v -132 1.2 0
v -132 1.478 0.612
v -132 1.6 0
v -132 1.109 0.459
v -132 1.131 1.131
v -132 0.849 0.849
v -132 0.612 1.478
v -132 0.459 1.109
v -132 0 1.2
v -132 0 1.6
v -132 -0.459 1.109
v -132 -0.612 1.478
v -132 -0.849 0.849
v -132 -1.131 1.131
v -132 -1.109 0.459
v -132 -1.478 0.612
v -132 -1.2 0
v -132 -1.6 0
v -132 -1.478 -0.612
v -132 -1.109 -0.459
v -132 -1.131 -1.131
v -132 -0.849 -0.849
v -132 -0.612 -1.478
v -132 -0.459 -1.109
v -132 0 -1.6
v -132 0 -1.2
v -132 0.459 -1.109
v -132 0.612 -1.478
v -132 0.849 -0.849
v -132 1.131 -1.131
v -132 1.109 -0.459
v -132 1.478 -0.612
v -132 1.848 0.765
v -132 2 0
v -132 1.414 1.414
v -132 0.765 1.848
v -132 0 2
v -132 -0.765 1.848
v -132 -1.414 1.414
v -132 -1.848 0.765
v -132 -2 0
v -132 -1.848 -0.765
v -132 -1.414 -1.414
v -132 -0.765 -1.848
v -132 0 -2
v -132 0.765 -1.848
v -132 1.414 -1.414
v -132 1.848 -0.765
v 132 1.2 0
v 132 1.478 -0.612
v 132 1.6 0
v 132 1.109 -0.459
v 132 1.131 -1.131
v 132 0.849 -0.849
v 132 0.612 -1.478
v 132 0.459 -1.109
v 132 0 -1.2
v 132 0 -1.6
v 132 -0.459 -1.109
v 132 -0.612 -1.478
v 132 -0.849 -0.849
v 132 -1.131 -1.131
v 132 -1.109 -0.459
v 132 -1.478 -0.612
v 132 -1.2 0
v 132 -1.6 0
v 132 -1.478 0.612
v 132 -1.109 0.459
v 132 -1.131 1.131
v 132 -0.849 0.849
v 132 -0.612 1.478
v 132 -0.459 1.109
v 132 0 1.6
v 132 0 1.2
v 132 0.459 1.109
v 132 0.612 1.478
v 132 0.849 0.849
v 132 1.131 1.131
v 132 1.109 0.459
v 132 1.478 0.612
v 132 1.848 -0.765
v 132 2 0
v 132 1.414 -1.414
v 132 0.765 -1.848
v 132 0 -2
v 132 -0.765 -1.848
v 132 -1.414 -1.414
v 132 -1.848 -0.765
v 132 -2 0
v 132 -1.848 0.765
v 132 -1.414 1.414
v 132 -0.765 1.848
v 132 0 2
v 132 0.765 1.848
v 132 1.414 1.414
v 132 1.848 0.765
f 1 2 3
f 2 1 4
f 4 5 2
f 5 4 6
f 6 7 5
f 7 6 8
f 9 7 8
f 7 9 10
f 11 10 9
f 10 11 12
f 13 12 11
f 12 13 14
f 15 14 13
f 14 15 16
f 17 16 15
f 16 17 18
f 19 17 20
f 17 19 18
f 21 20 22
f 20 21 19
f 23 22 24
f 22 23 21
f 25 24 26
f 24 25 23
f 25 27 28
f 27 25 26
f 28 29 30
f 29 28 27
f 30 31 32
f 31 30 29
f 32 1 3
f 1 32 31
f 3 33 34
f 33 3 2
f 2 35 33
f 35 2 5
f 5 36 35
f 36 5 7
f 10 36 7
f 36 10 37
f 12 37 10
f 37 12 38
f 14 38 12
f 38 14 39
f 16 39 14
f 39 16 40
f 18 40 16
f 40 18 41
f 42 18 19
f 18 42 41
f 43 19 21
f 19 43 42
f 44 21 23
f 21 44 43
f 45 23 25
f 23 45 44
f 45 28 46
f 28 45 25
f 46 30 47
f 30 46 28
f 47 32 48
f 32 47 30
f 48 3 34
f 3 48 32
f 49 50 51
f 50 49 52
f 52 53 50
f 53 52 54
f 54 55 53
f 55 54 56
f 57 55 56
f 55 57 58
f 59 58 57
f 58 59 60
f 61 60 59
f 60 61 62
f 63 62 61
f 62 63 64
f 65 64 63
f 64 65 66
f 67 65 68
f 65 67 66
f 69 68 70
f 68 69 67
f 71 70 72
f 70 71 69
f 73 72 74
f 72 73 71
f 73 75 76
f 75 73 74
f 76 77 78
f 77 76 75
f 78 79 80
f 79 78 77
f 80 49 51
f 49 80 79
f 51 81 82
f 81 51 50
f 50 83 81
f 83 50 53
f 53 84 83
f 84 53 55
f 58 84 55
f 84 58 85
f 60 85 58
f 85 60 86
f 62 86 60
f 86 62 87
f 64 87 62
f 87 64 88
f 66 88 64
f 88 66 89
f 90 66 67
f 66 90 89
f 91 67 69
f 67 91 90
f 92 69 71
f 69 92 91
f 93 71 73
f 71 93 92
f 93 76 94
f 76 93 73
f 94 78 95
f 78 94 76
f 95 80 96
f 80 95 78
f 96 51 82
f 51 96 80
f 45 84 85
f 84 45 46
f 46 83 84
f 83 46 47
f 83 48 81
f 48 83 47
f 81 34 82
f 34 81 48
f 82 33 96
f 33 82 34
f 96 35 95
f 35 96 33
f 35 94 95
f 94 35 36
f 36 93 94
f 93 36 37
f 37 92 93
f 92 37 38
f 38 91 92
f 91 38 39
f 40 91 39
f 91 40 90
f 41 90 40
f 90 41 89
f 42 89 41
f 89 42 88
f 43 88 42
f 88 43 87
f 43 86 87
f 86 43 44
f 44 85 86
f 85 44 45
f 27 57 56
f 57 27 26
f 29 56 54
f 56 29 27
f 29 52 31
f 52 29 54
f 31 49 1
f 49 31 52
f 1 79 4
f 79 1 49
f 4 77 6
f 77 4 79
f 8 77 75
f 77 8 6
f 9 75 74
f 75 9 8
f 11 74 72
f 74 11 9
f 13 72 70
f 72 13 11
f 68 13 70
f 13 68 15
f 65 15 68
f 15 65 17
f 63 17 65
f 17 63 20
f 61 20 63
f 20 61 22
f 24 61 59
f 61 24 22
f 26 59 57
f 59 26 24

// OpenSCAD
// file: ../p/4-4cyli.scad
use <../lib.scad>
function ldraw_lib__4_4cyli() = [
// 0 Cylinder 1.0
// 0 Name: 4-4cyli.dat
// 0 Author: James Jessiman
// 0 !LDRAW_ORG Primitive UPDATE 2005-01
// 0 !LICENSE Licensed under CC BY 2.0 and CC BY 4.0 : see CAreadme.txt
// 
// 0 BFC CERTIFY CCW
  [0,"BFC","CERTIFY"],
  [0,"BFC","CCW"],
// 
// 0 !HISTORY 1998-12-15 [PTadmin] Official Update 1998-10
// 0 !HISTORY 2002-03-23 [sbliss] Added BFC statement; merged headers from files in distributions LDraw 0.27 and Complete.
// 0 !HISTORY 2002-04-25 [PTadmin] Official Update 2002-02
// 0 !HISTORY 2004-12-14 [guyvivan] BFC CCW
// 0 !HISTORY 2005-12-28 [PTadmin] Official Update 2005-01
// 0 !HISTORY 2007-06-24 [PTadmin] Header formatted for Contributor Agreement
// 0 !HISTORY 2008-07-01 [PTadmin] Official Update 2008-01
// 
// 
// 4 16 1 1 0 0.9239 1 0.3827 0.9239 0 0.3827 1 0 0
  [4,16,1,1,0,0.9239,1,0.3827,0.9239,0,0.3827,1,0,0],
// 5 24 1 0 0 1 1 0 0.9239 0 0.3827 0.9239 0 -0.3827
  [5,24,1,0,0,1,1,0,0.9239,0,0.3827,0.9239,0,-0.3827],
// 4 16 0.9239 1 0.3827 0.7071 1 0.7071 0.7071 0 0.7071 0.9239 0 0.3827
  [4,16,0.9239,1,0.3827,0.7071,1,0.7071,0.7071,0,0.7071,0.9239,0,0.3827],
// 5 24 0.9239 0 0.3827 0.9239 1 0.3827 0.7071 0 0.7071 1 0 0
  [5,24,0.9239,0,0.3827,0.9239,1,0.3827,0.7071,0,0.7071,1,0,0],
// 4 16 0.7071 1 0.7071 0.3827 1 0.9239 0.3827 0 0.9239 0.7071 0 0.7071
  [4,16,0.7071,1,0.7071,0.3827,1,0.9239,0.3827,0,0.9239,0.7071,0,0.7071],
// 5 24 0.7071 0 0.7071 0.7071 1 0.7071 0.3827 0 0.9239 0.9239 0 0.3827
  [5,24,0.7071,0,0.7071,0.7071,1,0.7071,0.3827,0,0.9239,0.9239,0,0.3827],
// 4 16 0.3827 1 0.9239 0 1 1 0 0 1 0.3827 0 0.9239
  [4,16,0.3827,1,0.9239,0,1,1,0,0,1,0.3827,0,0.9239],
// 5 24 0.3827 0 0.9239 0.3827 1 0.9239 0 0 1 0.7071 0 0.7071
  [5,24,0.3827,0,0.9239,0.3827,1,0.9239,0,0,1,0.7071,0,0.7071],
// 4 16 0 1 1 -0.3827 1 0.9239 -0.3827 0 0.9239 0 0 1
  [4,16,0,1,1,-0.3827,1,0.9239,-0.3827,0,0.9239,0,0,1],
// 5 24 0 0 1 0 1 1 -0.3827 0 0.9239 0.3827 0 0.9239
  [5,24,0,0,1,0,1,1,-0.3827,0,0.9239,0.3827,0,0.9239],
// 4 16 -0.3827 1 0.9239 -0.7071 1 0.7071 -0.7071 0 0.7071 -0.3827 0 0.9239
  [4,16,-0.3827,1,0.9239,-0.7071,1,0.7071,-0.7071,0,0.7071,-0.3827,0,0.9239],
// 5 24 -0.3827 0 0.9239 -0.3827 1 0.9239 -0.7071 0 0.7071 0 0 1
  [5,24,-0.3827,0,0.9239,-0.3827,1,0.9239,-0.7071,0,0.7071,0,0,1],
// 4 16 -0.7071 1 0.7071 -0.9239 1 0.3827 -0.9239 0 0.3827 -0.7071 0 0.7071
  [4,16,-0.7071,1,0.7071,-0.9239,1,0.3827,-0.9239,0,0.3827,-0.7071,0,0.7071],
// 5 24 -0.7071 0 0.7071 -0.7071 1 0.7071 -0.9239 0 0.3827 -0.3827 0 0.9239
  [5,24,-0.7071,0,0.7071,-0.7071,1,0.7071,-0.9239,0,0.3827,-0.3827,0,0.9239],
// 4 16 -0.9239 1 0.3827 -1 1 0 -1 0 0 -0.9239 0 0.3827
  [4,16,-0.9239,1,0.3827,-1,1,0,-1,0,0,-0.9239,0,0.3827],
// 5 24 -0.9239 0 0.3827 -0.9239 1 0.3827 -1 0 0 -0.7071 0 0.7071
  [5,24,-0.9239,0,0.3827,-0.9239,1,0.3827,-1,0,0,-0.7071,0,0.7071],
// 4 16 -1 1 0 -0.9239 1 -0.3827 -0.9239 0 -0.3827 -1 0 0
  [4,16,-1,1,0,-0.9239,1,-0.3827,-0.9239,0,-0.3827,-1,0,0],
// 5 24 -1 0 0 -1 1 0 -0.9239 0 -0.3827 -0.9239 0 0.3827
  [5,24,-1,0,0,-1,1,0,-0.9239,0,-0.3827,-0.9239,0,0.3827],
// 4 16 -0.9239 1 -0.3827 -0.7071 1 -0.7071 -0.7071 0 -0.7071 -0.9239 0 -0.3827
  [4,16,-0.9239,1,-0.3827,-0.7071,1,-0.7071,-0.7071,0,-0.7071,-0.9239,0,-0.3827],
// 5 24 -0.9239 0 -0.3827 -0.9239 1 -0.3827 -0.7071 0 -0.7071 -1 0 0
  [5,24,-0.9239,0,-0.3827,-0.9239,1,-0.3827,-0.7071,0,-0.7071,-1,0,0],
// 4 16 -0.7071 1 -0.7071 -0.3827 1 -0.9239 -0.3827 0 -0.9239 -0.7071 0 -0.7071
  [4,16,-0.7071,1,-0.7071,-0.3827,1,-0.9239,-0.3827,0,-0.9239,-0.7071,0,-0.7071],
// 5 24 -0.7071 0 -0.7071 -0.7071 1 -0.7071 -0.3827 0 -0.9239 -0.9239 0 -0.3827
  [5,24,-0.7071,0,-0.7071,-0.7071,1,-0.7071,-0.3827,0,-0.9239,-0.9239,0,-0.3827],
// 4 16 -0.3827 1 -0.9239 0 1 -1 0 0 -1 -0.3827 0 -0.9239
  [4,16,-0.3827,1,-0.9239,0,1,-1,0,0,-1,-0.3827,0,-0.9239],
// 5 24 -0.3827 0 -0.9239 -0.3827 1 -0.9239 0 0 -1 -0.7071 0 -0.7071
  [5,24,-0.3827,0,-0.9239,-0.3827,1,-0.9239,0,0,-1,-0.7071,0,-0.7071],
// 4 16 0 1 -1 0.3827 1 -0.9239 0.3827 0 -0.9239 0 0 -1
  [4,16,0,1,-1,0.3827,1,-0.9239,0.3827,0,-0.9239,0,0,-1],
// 5 24 0 0 -1 0 1 -1 0.3827 0 -0.9239 -0.3827 0 -0.9239
  [5,24,0,0,-1,0,1,-1,0.3827,0,-0.9239,-0.3827,0,-0.9239],
// 4 16 0.3827 1 -0.9239 0.7071 1 -0.7071 0.7071 0 -0.7071 0.3827 0 -0.9239
  [4,16,0.3827,1,-0.9239,0.7071,1,-0.7071,0.7071,0,-0.7071,0.3827,0,-0.9239],
// 5 24 0.3827 0 -0.9239 0.3827 1 -0.9239 0.7071 0 -0.7071 0 0 -1
  [5,24,0.3827,0,-0.9239,0.3827,1,-0.9239,0.7071,0,-0.7071,0,0,-1],
// 4 16 0.7071 1 -0.7071 0.9239 1 -0.3827 0.9239 0 -0.3827 0.7071 0 -0.7071
  [4,16,0.7071,1,-0.7071,0.9239,1,-0.3827,0.9239,0,-0.3827,0.7071,0,-0.7071],
// 5 24 0.7071 0 -0.7071 0.7071 1 -0.7071 0.9239 0 -0.3827 0.3827 0 -0.9239
  [5,24,0.7071,0,-0.7071,0.7071,1,-0.7071,0.9239,0,-0.3827,0.3827,0,-0.9239],
// 4 16 0.9239 1 -0.3827 1 1 0 1 0 0 0.9239 0 -0.3827
  [4,16,0.9239,1,-0.3827,1,1,0,1,0,0,0.9239,0,-0.3827],
// 5 24 0.9239 0 -0.3827 0.9239 1 -0.3827 1 0 0 0.7071 0 -0.7071
  [5,24,0.9239,0,-0.3827,0.9239,1,-0.3827,1,0,0,0.7071,0,-0.7071],
// 0
];
makepoly(ldraw_lib__4_4cyli(), line=0.2);
// file: ../p/4-4ring4.scad
use <../lib.scad>
function ldraw_lib__4_4ring4() = [
// 0 Ring  4 x 1.0
// 0 Name: 4-4ring4.dat
// 0 Author: James Jessiman
// 0 !LDRAW_ORG Primitive UPDATE 2009-01
// 0 !LICENSE Licensed under CC BY 2.0 and CC BY 4.0 : see CAreadme.txt
// 
// 0 BFC CERTIFY CCW
  [0,"BFC","CERTIFY"],
  [0,"BFC","CCW"],
// 
// 0 !HISTORY 1998-12-15 [PTadmin] Official Update 1998-10
// 0 !HISTORY 2002-04-08 [BrickCaster] Modified for BFC compliance
// 0 !HISTORY 2002-04-25 [PTadmin] Official Update 2002-02
// 0 !HISTORY 2007-06-24 [PTadmin] Header formatted for Contributor Agreement
// 0 !HISTORY 2008-07-01 [PTadmin] Official Update 2008-01
// 0 !HISTORY 2008-08-26 [cwdee] Switch polygon winding and rename
// 0 !HISTORY 2009-05-02 [PTadmin] Official Update 2009-01
// 
// 
// 4 16 -1.9135 0 4.6195 -1.5308 0 3.6956 0 0 4 0 0 5
  [4,16,-1.9135,0,4.6195,-1.5308,0,3.6956,0,0,4,0,0,5],
// 4 16 -3.5355 0 3.5355 -2.8284 0 2.8284 -1.5308 0 3.6956 -1.9135 0 4.6195
  [4,16,-3.5355,0,3.5355,-2.8284,0,2.8284,-1.5308,0,3.6956,-1.9135,0,4.6195],
// 4 16 -4.6195 0 1.9135 -3.6956 0 1.5308 -2.8284 0 2.8284 -3.5355 0 3.5355
  [4,16,-4.6195,0,1.9135,-3.6956,0,1.5308,-2.8284,0,2.8284,-3.5355,0,3.5355],
// 4 16 -5 0 0 -4 0 0 -3.6956 0 1.5308 -4.6195 0 1.9135
  [4,16,-5,0,0,-4,0,0,-3.6956,0,1.5308,-4.6195,0,1.9135],
// 4 16 -4.6195 0 -1.9135 -3.6956 0 -1.5308 -4 0 0 -5 0 0
  [4,16,-4.6195,0,-1.9135,-3.6956,0,-1.5308,-4,0,0,-5,0,0],
// 4 16 -3.5355 0 -3.5355 -2.8284 0 -2.8284 -3.6956 0 -1.5308 -4.6195 0 -1.9135
  [4,16,-3.5355,0,-3.5355,-2.8284,0,-2.8284,-3.6956,0,-1.5308,-4.6195,0,-1.9135],
// 4 16 -1.9135 0 -4.6195 -1.5308 0 -3.6956 -2.8284 0 -2.8284 -3.5355 0 -3.5355
  [4,16,-1.9135,0,-4.6195,-1.5308,0,-3.6956,-2.8284,0,-2.8284,-3.5355,0,-3.5355],
// 4 16 0 0 -5 0 0 -4 -1.5308 0 -3.6956 -1.9135 0 -4.6195
  [4,16,0,0,-5,0,0,-4,-1.5308,0,-3.6956,-1.9135,0,-4.6195],
// 4 16 1.9135 0 -4.6195 1.5308 0 -3.6956 0 0 -4 0 0 -5
  [4,16,1.9135,0,-4.6195,1.5308,0,-3.6956,0,0,-4,0,0,-5],
// 4 16 3.5355 0 -3.5355 2.8284 0 -2.8284 1.5308 0 -3.6956 1.9135 0 -4.6195
  [4,16,3.5355,0,-3.5355,2.8284,0,-2.8284,1.5308,0,-3.6956,1.9135,0,-4.6195],
// 4 16 4.6195 0 -1.9135 3.6956 0 -1.5308 2.8284 0 -2.8284 3.5355 0 -3.5355
  [4,16,4.6195,0,-1.9135,3.6956,0,-1.5308,2.8284,0,-2.8284,3.5355,0,-3.5355],
// 4 16 5 0 0 4 0 0 3.6956 0 -1.5308 4.6195 0 -1.9135
  [4,16,5,0,0,4,0,0,3.6956,0,-1.5308,4.6195,0,-1.9135],
// 4 16 4.6195 0 1.9135 3.6956 0 1.5308 4 0 0 5 0 0
  [4,16,4.6195,0,1.9135,3.6956,0,1.5308,4,0,0,5,0,0],
// 4 16 3.5355 0 3.5355 2.8284 0 2.8284 3.6956 0 1.5308 4.6195 0 1.9135
  [4,16,3.5355,0,3.5355,2.8284,0,2.8284,3.6956,0,1.5308,4.6195,0,1.9135],
// 4 16 1.9135 0 4.6195 1.5308 0 3.6956 2.8284 0 2.8284 3.5355 0 3.5355
  [4,16,1.9135,0,4.6195,1.5308,0,3.6956,2.8284,0,2.8284,3.5355,0,3.5355],
// 4 16 0 0 5 0 0 4 1.5308 0 3.6956 1.9135 0 4.6195
  [4,16,0,0,5,0,0,4,1.5308,0,3.6956,1.9135,0,4.6195],
// 0
];
makepoly(ldraw_lib__4_4ring4(), line=0.2);
// file: ../p/4-4ring3.scad
use <../lib.scad>
function ldraw_lib__4_4ring3() = [
// 0 Ring  3 x 1.0
// 0 Name: 4-4ring3.dat
// 0 Author: James Jessiman
// 0 !LDRAW_ORG Primitive UPDATE 2009-01
// 0 !LICENSE Licensed under CC BY 2.0 and CC BY 4.0 : see CAreadme.txt
// 
// 0 BFC CERTIFY CCW
  [0,"BFC","CERTIFY"],
  [0,"BFC","CCW"],
// 
// 0 !HISTORY 1998-12-15 [PTadmin] Official Update 1998-10
// 0 !HISTORY 2002-04-05 [hafhead] Added BFC statement
// 0 !HISTORY 2002-04-25 [PTadmin] Official Update 2002-02
// 0 !HISTORY 2007-06-24 [PTadmin] Header formatted for Contributor Agreement
// 0 !HISTORY 2008-07-01 [PTadmin] Official Update 2008-01
// 0 !HISTORY 2008-08-26 [cwdee] Switch polygon winding and rename
// 0 !HISTORY 2009-05-02 [PTadmin] Official Update 2009-01
// 
// 
// 4 16 -1.5308 0 3.6956 -1.1481 0 2.7717 0 0 3 0 0 4
  [4,16,-1.5308,0,3.6956,-1.1481,0,2.7717,0,0,3,0,0,4],
// 4 16 -2.8284 0 2.8284 -2.1213 0 2.1213 -1.1481 0 2.7717 -1.5308 0 3.6956
  [4,16,-2.8284,0,2.8284,-2.1213,0,2.1213,-1.1481,0,2.7717,-1.5308,0,3.6956],
// 4 16 -3.6956 0 1.5308 -2.7717 0 1.1481 -2.1213 0 2.1213 -2.8284 0 2.8284
  [4,16,-3.6956,0,1.5308,-2.7717,0,1.1481,-2.1213,0,2.1213,-2.8284,0,2.8284],
// 4 16 -4 0 0 -3 0 0 -2.7717 0 1.1481 -3.6956 0 1.5308
  [4,16,-4,0,0,-3,0,0,-2.7717,0,1.1481,-3.6956,0,1.5308],
// 4 16 -3.6956 0 -1.5308 -2.7717 0 -1.1481 -3 0 0 -4 0 0
  [4,16,-3.6956,0,-1.5308,-2.7717,0,-1.1481,-3,0,0,-4,0,0],
// 4 16 -2.8284 0 -2.8284 -2.1213 0 -2.1213 -2.7717 0 -1.1481 -3.6956 0 -1.5308
  [4,16,-2.8284,0,-2.8284,-2.1213,0,-2.1213,-2.7717,0,-1.1481,-3.6956,0,-1.5308],
// 4 16 -1.5308 0 -3.6956 -1.1481 0 -2.7717 -2.1213 0 -2.1213 -2.8284 0 -2.8284
  [4,16,-1.5308,0,-3.6956,-1.1481,0,-2.7717,-2.1213,0,-2.1213,-2.8284,0,-2.8284],
// 4 16 0 0 -4 0 0 -3 -1.1481 0 -2.7717 -1.5308 0 -3.6956
  [4,16,0,0,-4,0,0,-3,-1.1481,0,-2.7717,-1.5308,0,-3.6956],
// 4 16 1.5308 0 -3.6956 1.1481 0 -2.7717 0 0 -3 0 0 -4
  [4,16,1.5308,0,-3.6956,1.1481,0,-2.7717,0,0,-3,0,0,-4],
// 4 16 2.8284 0 -2.8284 2.1213 0 -2.1213 1.1481 0 -2.7717 1.5308 0 -3.6956
  [4,16,2.8284,0,-2.8284,2.1213,0,-2.1213,1.1481,0,-2.7717,1.5308,0,-3.6956],
// 4 16 3.6956 0 -1.5308 2.7717 0 -1.1481 2.1213 0 -2.1213 2.8284 0 -2.8284
  [4,16,3.6956,0,-1.5308,2.7717,0,-1.1481,2.1213,0,-2.1213,2.8284,0,-2.8284],
// 4 16 4 0 0 3 0 0 2.7717 0 -1.1481 3.6956 0 -1.5308
  [4,16,4,0,0,3,0,0,2.7717,0,-1.1481,3.6956,0,-1.5308],
// 4 16 3.6956 0 1.5308 2.7717 0 1.1481 3 0 0 4 0 0
  [4,16,3.6956,0,1.5308,2.7717,0,1.1481,3,0,0,4,0,0],
// 4 16 2.8284 0 2.8284 2.1213 0 2.1213 2.7717 0 1.1481 3.6956 0 1.5308
  [4,16,2.8284,0,2.8284,2.1213,0,2.1213,2.7717,0,1.1481,3.6956,0,1.5308],
// 4 16 1.5308 0 3.6956 1.1481 0 2.7717 2.1213 0 2.1213 2.8284 0 2.8284
  [4,16,1.5308,0,3.6956,1.1481,0,2.7717,2.1213,0,2.1213,2.8284,0,2.8284],
// 4 16 0 0 4 0 0 3 1.1481 0 2.7717 1.5308 0 3.6956
  [4,16,0,0,4,0,0,3,1.1481,0,2.7717,1.5308,0,3.6956],
// 0
];
makepoly(ldraw_lib__4_4ring3(), line=0.2);
// file: ../p/4-4edge.scad
use <../lib.scad>
function ldraw_lib__4_4edge() = [
// 0 Circle 1.0
// 0 Name: 4-4edge.dat
// 0 Author: James Jessiman
// 0 !LDRAW_ORG Primitive UPDATE 2017-01
// 0 !LICENSE Licensed under CC BY 2.0 and CC BY 4.0 : see CAreadme.txt
// 
// 0 BFC CERTIFY CCW
  [0,"BFC","CERTIFY"],
  [0,"BFC","CCW"],
// 
// 0 !HISTORY 1998-12-15 [PTadmin] Official Update 1998-10
// 0 !HISTORY 2005-12-28 [PTadmin] Official Update 2005-01
// 0 !HISTORY 2007-06-24 [PTadmin] Header formatted for Contributor Agreement
// 0 !HISTORY 2008-07-01 [PTadmin] Official Update 2008-01
// 0 !HISTORY 2017-01-15 [Steffen] BFCed
// 0 !HISTORY 2017-12-30 [PTadmin] Official Update 2017-01
// 
// 
// 2 24 1 0 0 0.9239 0 0.3827
  [2,24,1,0,0,0.9239,0,0.3827],
// 2 24 0.9239 0 0.3827 0.7071 0 0.7071
  [2,24,0.9239,0,0.3827,0.7071,0,0.7071],
// 2 24 0.7071 0 0.7071 0.3827 0 0.9239
  [2,24,0.7071,0,0.7071,0.3827,0,0.9239],
// 2 24 0.3827 0 0.9239 0 0 1
  [2,24,0.3827,0,0.9239,0,0,1],
// 2 24 0 0 1 -0.3827 0 0.9239
  [2,24,0,0,1,-0.3827,0,0.9239],
// 2 24 -0.3827 0 0.9239 -0.7071 0 0.7071
  [2,24,-0.3827,0,0.9239,-0.7071,0,0.7071],
// 2 24 -0.7071 0 0.7071 -0.9239 0 0.3827
  [2,24,-0.7071,0,0.7071,-0.9239,0,0.3827],
// 2 24 -0.9239 0 0.3827 -1 0 -0
  [2,24,-0.9239,0,0.3827,-1,0,-0],
// 2 24 -1 0 -0 -0.9239 0 -0.3827
  [2,24,-1,0,-0,-0.9239,0,-0.3827],
// 2 24 -0.9239 0 -0.3827 -0.7071 0 -0.7071
  [2,24,-0.9239,0,-0.3827,-0.7071,0,-0.7071],
// 2 24 -0.7071 0 -0.7071 -0.3827 0 -0.9239
  [2,24,-0.7071,0,-0.7071,-0.3827,0,-0.9239],
// 2 24 -0.3827 0 -0.9239 0 0 -1
  [2,24,-0.3827,0,-0.9239,0,0,-1],
// 2 24 0 0 -1 0.3827 0 -0.9239
  [2,24,0,0,-1,0.3827,0,-0.9239],
// 2 24 0.3827 0 -0.9239 0.7071 0 -0.7071
  [2,24,0.3827,0,-0.9239,0.7071,0,-0.7071],
// 2 24 0.7071 0 -0.7071 0.9239 0 -0.3827
  [2,24,0.7071,0,-0.7071,0.9239,0,-0.3827],
// 2 24 0.9239 0 -0.3827 1 0 0
  [2,24,0.9239,0,-0.3827,1,0,0],
];
makepoly(ldraw_lib__4_4edge(), line=0.2);
// file: 71533k03.scad
use <../lib.scad>
use <../p/4-4cyli.scad>
function ldraw_lib__71533k03() = [
// 0 ~Technic Pneumatic Tube Segment
// 0 Name: 71533k03.dat
// 0 Author: Jaco van der Molen [Jaco]
// 0 !LDRAW_ORG Part Flexible_Section UPDATE 2020-01
// 0 !LICENSE Licensed under CC BY 2.0 and CC BY 4.0 : see CAreadme.txt
// 
// 0 BFC CERTIFY CW
  [0,"BFC","CERTIFY"],
  [0,"BFC","CW"],
// 
// 0 !HISTORY 2003-11-30 [Steffen] BFCed
// 0 !HISTORY 2009-12-29 [PTadmin] Official Update 2009-03
// 0 !HISTORY 2020-06-27 [PTadmin] Renamed from 166
// 0 !HISTORY 2020-06-28 [PTadmin] Official Update 2020-01
// 
// 
// 1 16 0 0 0 5 0 0 0 1 0 0 0 5 4-4cyli.dat
  [1,16,0,0,0,5,0,0,0,1,0,0,0,5, ldraw_lib__4_4cyli()],
// 0 BFC INVERTNEXT
  [0,"BFC","INVERTNEXT"],
// 1 16 0 0 0 3 0 0 0 1 0 0 0 3 4-4cyli.dat
  [1,16,0,0,0,3,0,0,0,1,0,0,0,3, ldraw_lib__4_4cyli()],
// 0
];
makepoly(ldraw_lib__71533k03(), line=0.2);
// file: 71533k02.scad
use <../lib.scad>
use <../p/4-4edge.scad>
use <../p/4-4ring3.scad>
use <../p/4-4ring4.scad>
function ldraw_lib__71533k02() = [
// 0 ~Technic Pneumatic Tube End (Non-Bulged)
// 0 Name: 71533k02.dat
// 0 Author: Steffen [Steffen]
// 0 !LDRAW_ORG Part Flexible_Section UPDATE 2020-01
// 0 !LICENSE Licensed under CC BY 2.0 and CC BY 4.0 : see CAreadme.txt
// 
// 0 BFC CERTIFY CCW
  [0,"BFC","CERTIFY"],
  [0,"BFC","CCW"],
// 
// 0 !HISTORY 2020-06-28 [PTadmin] Official Update 2020-01
// 
// 
// 0 // This file goes together with 71533k01.dat and 71533k03.dat.
// 0 // Those 3 files can be used to create Technic Pneumatic Tubes
// 0 // with either bulged or non-bulged ends.
// 
// 1 16 0 0 0 1 0 0 0 1 0 0 0 1 4-4ring3.dat
  [1,16,0,0,0,1,0,0,0,1,0,0,0,1, ldraw_lib__4_4ring3()],
// 1 16 0 0 0 1 0 0 0 1 0 0 0 1 4-4ring4.dat
  [1,16,0,0,0,1,0,0,0,1,0,0,0,1, ldraw_lib__4_4ring4()],
// 1 16 0 0 0 3 0 0 0 3 0 0 0 3 4-4edge.dat
  [1,16,0,0,0,3,0,0,0,3,0,0,0,3, ldraw_lib__4_4edge()],
// 1 16 0 0 0 5 0 0 0 5 0 0 0 5 4-4edge.dat
  [1,16,0,0,0,5,0,0,0,5,0,0,0,5, ldraw_lib__4_4edge()],
];
makepoly(ldraw_lib__71533k02(), line=0.2);
// main file
use <../lib.scad>
use <71533k02.scad>
use <71533k03.scad>
function ldraw_lib__96889_f1() = [
// 0 Technic Pneumatic Tube 33L
// 0 Name: 96889-f1.dat
// 0 Author: Philippe Hurbain [Philo]
// 0 !LDRAW_ORG Part UPDATE 2020-02
// 0 !LICENSE Licensed under CC BY 2.0 and CC BY 4.0 : see CAreadme.txt
// 
// 0 BFC CERTIFY CCW
  [0,"BFC","CERTIFY"],
  [0,"BFC","CCW"],
// 
// 0 !KEYWORDS 264 mm
// 
// 0 !HISTORY 2020-09-05 [PTadmin] Official Update 2020-02
// 
// 
// 1 16 -330 0 0 0 1 0 1 0 0 0 0 1 71533k02.dat
  [1,16,-330,0,0,0,1,0,1,0,0,0,0,1, ldraw_lib__71533k02()],
// 1 16 330 0 0 0 -1 0 -1 0 0 0 0 1 71533k02.dat
  [1,16,330,0,0,0,-1,0,-1,0,0,0,0,1, ldraw_lib__71533k02()],
// 1 16 -330 0 0 0 660 0 1 0 0 0 0 1 71533k03.dat
  [1,16,-330,0,0,0,660,0,1,0,0,0,0,1, ldraw_lib__71533k03()],
];
makepoly(ldraw_lib__96889_f1(), line=0.2);
